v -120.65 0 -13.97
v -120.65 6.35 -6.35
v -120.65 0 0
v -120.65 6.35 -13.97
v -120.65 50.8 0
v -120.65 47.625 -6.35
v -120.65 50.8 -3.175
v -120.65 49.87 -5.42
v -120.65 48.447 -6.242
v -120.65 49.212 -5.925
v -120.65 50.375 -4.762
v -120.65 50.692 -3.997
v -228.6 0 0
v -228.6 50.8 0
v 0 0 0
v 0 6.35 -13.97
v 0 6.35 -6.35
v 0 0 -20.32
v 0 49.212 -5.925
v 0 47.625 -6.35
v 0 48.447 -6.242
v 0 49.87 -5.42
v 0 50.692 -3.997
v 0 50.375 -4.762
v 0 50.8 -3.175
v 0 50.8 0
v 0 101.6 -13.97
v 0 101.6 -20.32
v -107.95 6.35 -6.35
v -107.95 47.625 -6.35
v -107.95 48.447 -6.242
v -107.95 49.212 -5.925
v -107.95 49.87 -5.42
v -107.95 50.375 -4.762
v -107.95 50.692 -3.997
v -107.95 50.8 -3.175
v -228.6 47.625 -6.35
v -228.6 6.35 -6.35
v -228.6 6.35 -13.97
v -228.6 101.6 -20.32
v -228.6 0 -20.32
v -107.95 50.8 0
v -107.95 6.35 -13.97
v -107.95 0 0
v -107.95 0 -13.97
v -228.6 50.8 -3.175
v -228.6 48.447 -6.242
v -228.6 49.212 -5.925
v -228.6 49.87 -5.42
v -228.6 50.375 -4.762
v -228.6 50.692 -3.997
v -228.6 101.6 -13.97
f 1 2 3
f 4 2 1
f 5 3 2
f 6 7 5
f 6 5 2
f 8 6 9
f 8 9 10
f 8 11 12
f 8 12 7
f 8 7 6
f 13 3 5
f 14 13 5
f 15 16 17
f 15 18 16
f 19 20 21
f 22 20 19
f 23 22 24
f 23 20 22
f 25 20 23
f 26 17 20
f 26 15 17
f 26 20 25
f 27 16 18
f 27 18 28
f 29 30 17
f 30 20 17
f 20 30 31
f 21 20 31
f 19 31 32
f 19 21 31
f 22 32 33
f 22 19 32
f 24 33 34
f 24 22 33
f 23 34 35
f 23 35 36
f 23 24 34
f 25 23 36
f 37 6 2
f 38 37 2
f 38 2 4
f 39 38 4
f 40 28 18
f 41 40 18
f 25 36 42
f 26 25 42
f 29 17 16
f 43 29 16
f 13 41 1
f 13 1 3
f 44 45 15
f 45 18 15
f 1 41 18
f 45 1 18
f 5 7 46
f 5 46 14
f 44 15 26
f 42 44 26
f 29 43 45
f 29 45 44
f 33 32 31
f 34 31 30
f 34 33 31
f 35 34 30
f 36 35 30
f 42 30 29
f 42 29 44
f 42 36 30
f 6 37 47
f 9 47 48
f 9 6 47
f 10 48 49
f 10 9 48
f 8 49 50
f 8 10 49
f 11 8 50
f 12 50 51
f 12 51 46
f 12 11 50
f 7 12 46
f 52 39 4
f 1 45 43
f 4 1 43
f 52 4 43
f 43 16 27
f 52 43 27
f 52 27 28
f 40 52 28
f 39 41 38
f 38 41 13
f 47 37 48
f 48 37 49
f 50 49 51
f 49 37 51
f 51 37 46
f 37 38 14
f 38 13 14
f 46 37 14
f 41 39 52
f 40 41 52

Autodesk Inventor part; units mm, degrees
ref_plane "YZ Plane" through (0, 0, 0) normal (1, 0, 0) x (0, 1, 0)
ref_plane "XZ Plane" through (0, 0, 0) normal (0, 1, 0) x (-1, 0, 0)
ref_plane "XY Plane" through (0, 0, 0) normal (0, 0, 1) x (1, 0, 0)
sketch "Sketch5" plane through (0, 0, 0) normal (1, 0, 0) x (0, 1, 0)
  line L0 (0, 0) -> (101.6, 0)
  line L1 (101.6, 0) -> (101.6, -20.32)
  line L2 (101.6, -20.32) -> (0, -20.32)
  line L3 (0, -20.32) -> (0, 0)
  line L4 (101.6, -6.35) -> (6.35, -6.35)
  line L5 (6.35, -6.35) -> (6.35, -13.97)
  line L6 (6.35, -13.97) -> (101.6, -13.97)
  line L7 (101.6, -13.97) -> (101.6, -6.35)
  line L8 (101.6, 0) -> (50.8, 0)
  line L9 (50.8, -6.35) -> (101.6, -6.35)
  line L10 (101.6, -6.35) -> (101.6, 0)
  dimension "d26" = 101.6
  dimension "d27" = 20.32
  dimension "d28" = 95.25
  dimension "d29" = 7.62
  dimension "d30" = 6.35
  dimension "d31" = 50.8
extrude "Extrusion4" add sketch "Sketch5" against normal blind 228.6
sketch "Sketch6" plane through (0, 0, 0) normal (1, 0, 0) x (0, 0, -1)
  line L0 (0, 101.6) -> (0, 0) projected
  line L1 (20.32, 0) -> (20.32, 101.6) projected
  line L2 (20.32, 101.6) -> (0, 101.6) projected
  line L3 (0, 0) -> (20.32, 0) projected
  line L4 (0, 101.6) -> (20.32, 101.6) projected
  line L5 (13.97, 101.6) -> (6.35, 101.6)
  line L6 (6.35, 101.6) -> (6.35, 6.35)
  line L7 (6.35, 6.35) -> (13.97, 6.35)
  line L8 (13.97, 6.35) -> (13.97, 101.6)
  line L9 (0, 0) -> (0, 101.6) projected
  line L10 (0, 101.6) -> (6.35, 101.6)
  line L11 (6.35, 101.6) -> (6.35, 50.8)
  line L12 (6.35, 50.8) -> (0, 50.8)
  line L13 (0, 50.8) -> (0, 101.6)
  dimension "d34" = 7.62
  dimension "d35" = 95.25
  dimension "d36" = 6.35
  dimension "d37" = 50.8
extrude "Extrusion5" cut sketch "Sketch6" against normal blind 228.6 contours L2 L8 L7 L6
sketch "Sketch7" plane through (0, 0, 0) normal (1, 0, 0) x (0, 0, -1)
  line L0 (6.35, 6.35) -> (6.35, 101.6) projected
  line L1 (6.35, 101.6) -> (0, 101.6) projected
  line L2 (0, 101.6) -> (0, 0) projected
  line L3 (0, 0) -> (20.32, 0) projected
  line L4 (20.32, 0) -> (20.32, 101.6) projected
  line L5 (20.32, 101.6) -> (13.97, 101.6) projected
  line L6 (13.97, 101.6) -> (13.97, 6.35) projected
  line L7 (13.97, 6.35) -> (6.35, 6.35) projected
  line L8 (0, 101.6) -> (0, 0) projected
  line L9 (6.35, 6.35) -> (6.35, 101.6) projected
  line L10 (0, 101.6) -> (3.175, 101.6)
  line L11 (6.35, 98.425) -> (6.35, 50.8)
  line L12 (6.35, 50.8) -> (0, 50.8)
  line L13 (0, 50.8) -> (0, 101.6)
  arc A0 (6.35, 98.425) -> (3.175, 101.6) centre (3.175, 98.425) ccw
  line L14 (0, 0) -> (20.32, 0) projected
  line L15 (0, 50.8) -> (3.175, 50.8)
  line L16 (6.35, 47.625) -> (6.35, 0)
  line L17 (6.35, 0) -> (0, 0)
  line L18 (0, 0) -> (0, 50.8)
  arc A1 (6.35, 47.625) -> (3.175, 50.8) centre (3.175, 47.625) ccw
  line L19 (6.35, 50.8) -> (6.35, 41.6275)
  dimension "d40" = 50.8
  dimension "d47" = 3.175
  dimension "d48" = 3.175
extrude "Extrusion6" cut sketch "Sketch7" against normal blind 228.6 contours A1 L12 L0 | L12 L2 L1 A0 L0 | A0 L1 L0
sketch "Sketch8" plane through (0, 50.8, 0) normal (0, 1, 0) x (1, 0, 0)
  line L0 (0, 13.97) -> (0, 6.35) projected
  line L1 (0, 13.97) -> (-228.6, 13.97) projected
  line L2 (-228.6, 6.35) -> (-228.6, 13.97) projected
  line L3 (0, 6.35) -> (-228.6, 6.35) projected
  line L4 (0, 3.175) -> (0, 0) projected
  line L5 (-228.6, 0) -> (-228.6, 3.175) projected
  line L6 (0, 0) -> (-228.6, 0) projected
  line L7 (-228.6, 13.97) -> (0, 13.97) projected
  line L8 (0, 20.32) -> (0, 13.97) projected
  line L9 (0, 20.32) -> (-228.6, 20.32) projected
  line L10 (-228.6, 13.97) -> (-228.6, 20.32) projected
  line L11 (-228.6, 13.97) -> (0, 13.97) projected
  line L12 (0, 0) -> (-228.6, 0) projected
  line L13 (0, 13.97) -> (-228.6, 13.97) projected
  line L14 (-107.95, 0) -> (-120.65, 0)
  line L15 (-120.65, 0) -> (-120.65, 13.97)
  line L16 (-120.65, 13.97) -> (-107.95, 13.97)
  line L17 (-107.95, 13.97) -> (-107.95, 0)
  line L18 (0, 3.175) -> (-228.6, 3.175) projected
  dimension "d43" = 12.7
  dimension "d44" = 107.95
extrude "Extrusion7" cut sketch "Sketch8" against normal blind 228.6 contours L17 L3 L15 L1 | L17 L18 L15 L3 | L17 L6 L15 L18
properties part number "Handles"
